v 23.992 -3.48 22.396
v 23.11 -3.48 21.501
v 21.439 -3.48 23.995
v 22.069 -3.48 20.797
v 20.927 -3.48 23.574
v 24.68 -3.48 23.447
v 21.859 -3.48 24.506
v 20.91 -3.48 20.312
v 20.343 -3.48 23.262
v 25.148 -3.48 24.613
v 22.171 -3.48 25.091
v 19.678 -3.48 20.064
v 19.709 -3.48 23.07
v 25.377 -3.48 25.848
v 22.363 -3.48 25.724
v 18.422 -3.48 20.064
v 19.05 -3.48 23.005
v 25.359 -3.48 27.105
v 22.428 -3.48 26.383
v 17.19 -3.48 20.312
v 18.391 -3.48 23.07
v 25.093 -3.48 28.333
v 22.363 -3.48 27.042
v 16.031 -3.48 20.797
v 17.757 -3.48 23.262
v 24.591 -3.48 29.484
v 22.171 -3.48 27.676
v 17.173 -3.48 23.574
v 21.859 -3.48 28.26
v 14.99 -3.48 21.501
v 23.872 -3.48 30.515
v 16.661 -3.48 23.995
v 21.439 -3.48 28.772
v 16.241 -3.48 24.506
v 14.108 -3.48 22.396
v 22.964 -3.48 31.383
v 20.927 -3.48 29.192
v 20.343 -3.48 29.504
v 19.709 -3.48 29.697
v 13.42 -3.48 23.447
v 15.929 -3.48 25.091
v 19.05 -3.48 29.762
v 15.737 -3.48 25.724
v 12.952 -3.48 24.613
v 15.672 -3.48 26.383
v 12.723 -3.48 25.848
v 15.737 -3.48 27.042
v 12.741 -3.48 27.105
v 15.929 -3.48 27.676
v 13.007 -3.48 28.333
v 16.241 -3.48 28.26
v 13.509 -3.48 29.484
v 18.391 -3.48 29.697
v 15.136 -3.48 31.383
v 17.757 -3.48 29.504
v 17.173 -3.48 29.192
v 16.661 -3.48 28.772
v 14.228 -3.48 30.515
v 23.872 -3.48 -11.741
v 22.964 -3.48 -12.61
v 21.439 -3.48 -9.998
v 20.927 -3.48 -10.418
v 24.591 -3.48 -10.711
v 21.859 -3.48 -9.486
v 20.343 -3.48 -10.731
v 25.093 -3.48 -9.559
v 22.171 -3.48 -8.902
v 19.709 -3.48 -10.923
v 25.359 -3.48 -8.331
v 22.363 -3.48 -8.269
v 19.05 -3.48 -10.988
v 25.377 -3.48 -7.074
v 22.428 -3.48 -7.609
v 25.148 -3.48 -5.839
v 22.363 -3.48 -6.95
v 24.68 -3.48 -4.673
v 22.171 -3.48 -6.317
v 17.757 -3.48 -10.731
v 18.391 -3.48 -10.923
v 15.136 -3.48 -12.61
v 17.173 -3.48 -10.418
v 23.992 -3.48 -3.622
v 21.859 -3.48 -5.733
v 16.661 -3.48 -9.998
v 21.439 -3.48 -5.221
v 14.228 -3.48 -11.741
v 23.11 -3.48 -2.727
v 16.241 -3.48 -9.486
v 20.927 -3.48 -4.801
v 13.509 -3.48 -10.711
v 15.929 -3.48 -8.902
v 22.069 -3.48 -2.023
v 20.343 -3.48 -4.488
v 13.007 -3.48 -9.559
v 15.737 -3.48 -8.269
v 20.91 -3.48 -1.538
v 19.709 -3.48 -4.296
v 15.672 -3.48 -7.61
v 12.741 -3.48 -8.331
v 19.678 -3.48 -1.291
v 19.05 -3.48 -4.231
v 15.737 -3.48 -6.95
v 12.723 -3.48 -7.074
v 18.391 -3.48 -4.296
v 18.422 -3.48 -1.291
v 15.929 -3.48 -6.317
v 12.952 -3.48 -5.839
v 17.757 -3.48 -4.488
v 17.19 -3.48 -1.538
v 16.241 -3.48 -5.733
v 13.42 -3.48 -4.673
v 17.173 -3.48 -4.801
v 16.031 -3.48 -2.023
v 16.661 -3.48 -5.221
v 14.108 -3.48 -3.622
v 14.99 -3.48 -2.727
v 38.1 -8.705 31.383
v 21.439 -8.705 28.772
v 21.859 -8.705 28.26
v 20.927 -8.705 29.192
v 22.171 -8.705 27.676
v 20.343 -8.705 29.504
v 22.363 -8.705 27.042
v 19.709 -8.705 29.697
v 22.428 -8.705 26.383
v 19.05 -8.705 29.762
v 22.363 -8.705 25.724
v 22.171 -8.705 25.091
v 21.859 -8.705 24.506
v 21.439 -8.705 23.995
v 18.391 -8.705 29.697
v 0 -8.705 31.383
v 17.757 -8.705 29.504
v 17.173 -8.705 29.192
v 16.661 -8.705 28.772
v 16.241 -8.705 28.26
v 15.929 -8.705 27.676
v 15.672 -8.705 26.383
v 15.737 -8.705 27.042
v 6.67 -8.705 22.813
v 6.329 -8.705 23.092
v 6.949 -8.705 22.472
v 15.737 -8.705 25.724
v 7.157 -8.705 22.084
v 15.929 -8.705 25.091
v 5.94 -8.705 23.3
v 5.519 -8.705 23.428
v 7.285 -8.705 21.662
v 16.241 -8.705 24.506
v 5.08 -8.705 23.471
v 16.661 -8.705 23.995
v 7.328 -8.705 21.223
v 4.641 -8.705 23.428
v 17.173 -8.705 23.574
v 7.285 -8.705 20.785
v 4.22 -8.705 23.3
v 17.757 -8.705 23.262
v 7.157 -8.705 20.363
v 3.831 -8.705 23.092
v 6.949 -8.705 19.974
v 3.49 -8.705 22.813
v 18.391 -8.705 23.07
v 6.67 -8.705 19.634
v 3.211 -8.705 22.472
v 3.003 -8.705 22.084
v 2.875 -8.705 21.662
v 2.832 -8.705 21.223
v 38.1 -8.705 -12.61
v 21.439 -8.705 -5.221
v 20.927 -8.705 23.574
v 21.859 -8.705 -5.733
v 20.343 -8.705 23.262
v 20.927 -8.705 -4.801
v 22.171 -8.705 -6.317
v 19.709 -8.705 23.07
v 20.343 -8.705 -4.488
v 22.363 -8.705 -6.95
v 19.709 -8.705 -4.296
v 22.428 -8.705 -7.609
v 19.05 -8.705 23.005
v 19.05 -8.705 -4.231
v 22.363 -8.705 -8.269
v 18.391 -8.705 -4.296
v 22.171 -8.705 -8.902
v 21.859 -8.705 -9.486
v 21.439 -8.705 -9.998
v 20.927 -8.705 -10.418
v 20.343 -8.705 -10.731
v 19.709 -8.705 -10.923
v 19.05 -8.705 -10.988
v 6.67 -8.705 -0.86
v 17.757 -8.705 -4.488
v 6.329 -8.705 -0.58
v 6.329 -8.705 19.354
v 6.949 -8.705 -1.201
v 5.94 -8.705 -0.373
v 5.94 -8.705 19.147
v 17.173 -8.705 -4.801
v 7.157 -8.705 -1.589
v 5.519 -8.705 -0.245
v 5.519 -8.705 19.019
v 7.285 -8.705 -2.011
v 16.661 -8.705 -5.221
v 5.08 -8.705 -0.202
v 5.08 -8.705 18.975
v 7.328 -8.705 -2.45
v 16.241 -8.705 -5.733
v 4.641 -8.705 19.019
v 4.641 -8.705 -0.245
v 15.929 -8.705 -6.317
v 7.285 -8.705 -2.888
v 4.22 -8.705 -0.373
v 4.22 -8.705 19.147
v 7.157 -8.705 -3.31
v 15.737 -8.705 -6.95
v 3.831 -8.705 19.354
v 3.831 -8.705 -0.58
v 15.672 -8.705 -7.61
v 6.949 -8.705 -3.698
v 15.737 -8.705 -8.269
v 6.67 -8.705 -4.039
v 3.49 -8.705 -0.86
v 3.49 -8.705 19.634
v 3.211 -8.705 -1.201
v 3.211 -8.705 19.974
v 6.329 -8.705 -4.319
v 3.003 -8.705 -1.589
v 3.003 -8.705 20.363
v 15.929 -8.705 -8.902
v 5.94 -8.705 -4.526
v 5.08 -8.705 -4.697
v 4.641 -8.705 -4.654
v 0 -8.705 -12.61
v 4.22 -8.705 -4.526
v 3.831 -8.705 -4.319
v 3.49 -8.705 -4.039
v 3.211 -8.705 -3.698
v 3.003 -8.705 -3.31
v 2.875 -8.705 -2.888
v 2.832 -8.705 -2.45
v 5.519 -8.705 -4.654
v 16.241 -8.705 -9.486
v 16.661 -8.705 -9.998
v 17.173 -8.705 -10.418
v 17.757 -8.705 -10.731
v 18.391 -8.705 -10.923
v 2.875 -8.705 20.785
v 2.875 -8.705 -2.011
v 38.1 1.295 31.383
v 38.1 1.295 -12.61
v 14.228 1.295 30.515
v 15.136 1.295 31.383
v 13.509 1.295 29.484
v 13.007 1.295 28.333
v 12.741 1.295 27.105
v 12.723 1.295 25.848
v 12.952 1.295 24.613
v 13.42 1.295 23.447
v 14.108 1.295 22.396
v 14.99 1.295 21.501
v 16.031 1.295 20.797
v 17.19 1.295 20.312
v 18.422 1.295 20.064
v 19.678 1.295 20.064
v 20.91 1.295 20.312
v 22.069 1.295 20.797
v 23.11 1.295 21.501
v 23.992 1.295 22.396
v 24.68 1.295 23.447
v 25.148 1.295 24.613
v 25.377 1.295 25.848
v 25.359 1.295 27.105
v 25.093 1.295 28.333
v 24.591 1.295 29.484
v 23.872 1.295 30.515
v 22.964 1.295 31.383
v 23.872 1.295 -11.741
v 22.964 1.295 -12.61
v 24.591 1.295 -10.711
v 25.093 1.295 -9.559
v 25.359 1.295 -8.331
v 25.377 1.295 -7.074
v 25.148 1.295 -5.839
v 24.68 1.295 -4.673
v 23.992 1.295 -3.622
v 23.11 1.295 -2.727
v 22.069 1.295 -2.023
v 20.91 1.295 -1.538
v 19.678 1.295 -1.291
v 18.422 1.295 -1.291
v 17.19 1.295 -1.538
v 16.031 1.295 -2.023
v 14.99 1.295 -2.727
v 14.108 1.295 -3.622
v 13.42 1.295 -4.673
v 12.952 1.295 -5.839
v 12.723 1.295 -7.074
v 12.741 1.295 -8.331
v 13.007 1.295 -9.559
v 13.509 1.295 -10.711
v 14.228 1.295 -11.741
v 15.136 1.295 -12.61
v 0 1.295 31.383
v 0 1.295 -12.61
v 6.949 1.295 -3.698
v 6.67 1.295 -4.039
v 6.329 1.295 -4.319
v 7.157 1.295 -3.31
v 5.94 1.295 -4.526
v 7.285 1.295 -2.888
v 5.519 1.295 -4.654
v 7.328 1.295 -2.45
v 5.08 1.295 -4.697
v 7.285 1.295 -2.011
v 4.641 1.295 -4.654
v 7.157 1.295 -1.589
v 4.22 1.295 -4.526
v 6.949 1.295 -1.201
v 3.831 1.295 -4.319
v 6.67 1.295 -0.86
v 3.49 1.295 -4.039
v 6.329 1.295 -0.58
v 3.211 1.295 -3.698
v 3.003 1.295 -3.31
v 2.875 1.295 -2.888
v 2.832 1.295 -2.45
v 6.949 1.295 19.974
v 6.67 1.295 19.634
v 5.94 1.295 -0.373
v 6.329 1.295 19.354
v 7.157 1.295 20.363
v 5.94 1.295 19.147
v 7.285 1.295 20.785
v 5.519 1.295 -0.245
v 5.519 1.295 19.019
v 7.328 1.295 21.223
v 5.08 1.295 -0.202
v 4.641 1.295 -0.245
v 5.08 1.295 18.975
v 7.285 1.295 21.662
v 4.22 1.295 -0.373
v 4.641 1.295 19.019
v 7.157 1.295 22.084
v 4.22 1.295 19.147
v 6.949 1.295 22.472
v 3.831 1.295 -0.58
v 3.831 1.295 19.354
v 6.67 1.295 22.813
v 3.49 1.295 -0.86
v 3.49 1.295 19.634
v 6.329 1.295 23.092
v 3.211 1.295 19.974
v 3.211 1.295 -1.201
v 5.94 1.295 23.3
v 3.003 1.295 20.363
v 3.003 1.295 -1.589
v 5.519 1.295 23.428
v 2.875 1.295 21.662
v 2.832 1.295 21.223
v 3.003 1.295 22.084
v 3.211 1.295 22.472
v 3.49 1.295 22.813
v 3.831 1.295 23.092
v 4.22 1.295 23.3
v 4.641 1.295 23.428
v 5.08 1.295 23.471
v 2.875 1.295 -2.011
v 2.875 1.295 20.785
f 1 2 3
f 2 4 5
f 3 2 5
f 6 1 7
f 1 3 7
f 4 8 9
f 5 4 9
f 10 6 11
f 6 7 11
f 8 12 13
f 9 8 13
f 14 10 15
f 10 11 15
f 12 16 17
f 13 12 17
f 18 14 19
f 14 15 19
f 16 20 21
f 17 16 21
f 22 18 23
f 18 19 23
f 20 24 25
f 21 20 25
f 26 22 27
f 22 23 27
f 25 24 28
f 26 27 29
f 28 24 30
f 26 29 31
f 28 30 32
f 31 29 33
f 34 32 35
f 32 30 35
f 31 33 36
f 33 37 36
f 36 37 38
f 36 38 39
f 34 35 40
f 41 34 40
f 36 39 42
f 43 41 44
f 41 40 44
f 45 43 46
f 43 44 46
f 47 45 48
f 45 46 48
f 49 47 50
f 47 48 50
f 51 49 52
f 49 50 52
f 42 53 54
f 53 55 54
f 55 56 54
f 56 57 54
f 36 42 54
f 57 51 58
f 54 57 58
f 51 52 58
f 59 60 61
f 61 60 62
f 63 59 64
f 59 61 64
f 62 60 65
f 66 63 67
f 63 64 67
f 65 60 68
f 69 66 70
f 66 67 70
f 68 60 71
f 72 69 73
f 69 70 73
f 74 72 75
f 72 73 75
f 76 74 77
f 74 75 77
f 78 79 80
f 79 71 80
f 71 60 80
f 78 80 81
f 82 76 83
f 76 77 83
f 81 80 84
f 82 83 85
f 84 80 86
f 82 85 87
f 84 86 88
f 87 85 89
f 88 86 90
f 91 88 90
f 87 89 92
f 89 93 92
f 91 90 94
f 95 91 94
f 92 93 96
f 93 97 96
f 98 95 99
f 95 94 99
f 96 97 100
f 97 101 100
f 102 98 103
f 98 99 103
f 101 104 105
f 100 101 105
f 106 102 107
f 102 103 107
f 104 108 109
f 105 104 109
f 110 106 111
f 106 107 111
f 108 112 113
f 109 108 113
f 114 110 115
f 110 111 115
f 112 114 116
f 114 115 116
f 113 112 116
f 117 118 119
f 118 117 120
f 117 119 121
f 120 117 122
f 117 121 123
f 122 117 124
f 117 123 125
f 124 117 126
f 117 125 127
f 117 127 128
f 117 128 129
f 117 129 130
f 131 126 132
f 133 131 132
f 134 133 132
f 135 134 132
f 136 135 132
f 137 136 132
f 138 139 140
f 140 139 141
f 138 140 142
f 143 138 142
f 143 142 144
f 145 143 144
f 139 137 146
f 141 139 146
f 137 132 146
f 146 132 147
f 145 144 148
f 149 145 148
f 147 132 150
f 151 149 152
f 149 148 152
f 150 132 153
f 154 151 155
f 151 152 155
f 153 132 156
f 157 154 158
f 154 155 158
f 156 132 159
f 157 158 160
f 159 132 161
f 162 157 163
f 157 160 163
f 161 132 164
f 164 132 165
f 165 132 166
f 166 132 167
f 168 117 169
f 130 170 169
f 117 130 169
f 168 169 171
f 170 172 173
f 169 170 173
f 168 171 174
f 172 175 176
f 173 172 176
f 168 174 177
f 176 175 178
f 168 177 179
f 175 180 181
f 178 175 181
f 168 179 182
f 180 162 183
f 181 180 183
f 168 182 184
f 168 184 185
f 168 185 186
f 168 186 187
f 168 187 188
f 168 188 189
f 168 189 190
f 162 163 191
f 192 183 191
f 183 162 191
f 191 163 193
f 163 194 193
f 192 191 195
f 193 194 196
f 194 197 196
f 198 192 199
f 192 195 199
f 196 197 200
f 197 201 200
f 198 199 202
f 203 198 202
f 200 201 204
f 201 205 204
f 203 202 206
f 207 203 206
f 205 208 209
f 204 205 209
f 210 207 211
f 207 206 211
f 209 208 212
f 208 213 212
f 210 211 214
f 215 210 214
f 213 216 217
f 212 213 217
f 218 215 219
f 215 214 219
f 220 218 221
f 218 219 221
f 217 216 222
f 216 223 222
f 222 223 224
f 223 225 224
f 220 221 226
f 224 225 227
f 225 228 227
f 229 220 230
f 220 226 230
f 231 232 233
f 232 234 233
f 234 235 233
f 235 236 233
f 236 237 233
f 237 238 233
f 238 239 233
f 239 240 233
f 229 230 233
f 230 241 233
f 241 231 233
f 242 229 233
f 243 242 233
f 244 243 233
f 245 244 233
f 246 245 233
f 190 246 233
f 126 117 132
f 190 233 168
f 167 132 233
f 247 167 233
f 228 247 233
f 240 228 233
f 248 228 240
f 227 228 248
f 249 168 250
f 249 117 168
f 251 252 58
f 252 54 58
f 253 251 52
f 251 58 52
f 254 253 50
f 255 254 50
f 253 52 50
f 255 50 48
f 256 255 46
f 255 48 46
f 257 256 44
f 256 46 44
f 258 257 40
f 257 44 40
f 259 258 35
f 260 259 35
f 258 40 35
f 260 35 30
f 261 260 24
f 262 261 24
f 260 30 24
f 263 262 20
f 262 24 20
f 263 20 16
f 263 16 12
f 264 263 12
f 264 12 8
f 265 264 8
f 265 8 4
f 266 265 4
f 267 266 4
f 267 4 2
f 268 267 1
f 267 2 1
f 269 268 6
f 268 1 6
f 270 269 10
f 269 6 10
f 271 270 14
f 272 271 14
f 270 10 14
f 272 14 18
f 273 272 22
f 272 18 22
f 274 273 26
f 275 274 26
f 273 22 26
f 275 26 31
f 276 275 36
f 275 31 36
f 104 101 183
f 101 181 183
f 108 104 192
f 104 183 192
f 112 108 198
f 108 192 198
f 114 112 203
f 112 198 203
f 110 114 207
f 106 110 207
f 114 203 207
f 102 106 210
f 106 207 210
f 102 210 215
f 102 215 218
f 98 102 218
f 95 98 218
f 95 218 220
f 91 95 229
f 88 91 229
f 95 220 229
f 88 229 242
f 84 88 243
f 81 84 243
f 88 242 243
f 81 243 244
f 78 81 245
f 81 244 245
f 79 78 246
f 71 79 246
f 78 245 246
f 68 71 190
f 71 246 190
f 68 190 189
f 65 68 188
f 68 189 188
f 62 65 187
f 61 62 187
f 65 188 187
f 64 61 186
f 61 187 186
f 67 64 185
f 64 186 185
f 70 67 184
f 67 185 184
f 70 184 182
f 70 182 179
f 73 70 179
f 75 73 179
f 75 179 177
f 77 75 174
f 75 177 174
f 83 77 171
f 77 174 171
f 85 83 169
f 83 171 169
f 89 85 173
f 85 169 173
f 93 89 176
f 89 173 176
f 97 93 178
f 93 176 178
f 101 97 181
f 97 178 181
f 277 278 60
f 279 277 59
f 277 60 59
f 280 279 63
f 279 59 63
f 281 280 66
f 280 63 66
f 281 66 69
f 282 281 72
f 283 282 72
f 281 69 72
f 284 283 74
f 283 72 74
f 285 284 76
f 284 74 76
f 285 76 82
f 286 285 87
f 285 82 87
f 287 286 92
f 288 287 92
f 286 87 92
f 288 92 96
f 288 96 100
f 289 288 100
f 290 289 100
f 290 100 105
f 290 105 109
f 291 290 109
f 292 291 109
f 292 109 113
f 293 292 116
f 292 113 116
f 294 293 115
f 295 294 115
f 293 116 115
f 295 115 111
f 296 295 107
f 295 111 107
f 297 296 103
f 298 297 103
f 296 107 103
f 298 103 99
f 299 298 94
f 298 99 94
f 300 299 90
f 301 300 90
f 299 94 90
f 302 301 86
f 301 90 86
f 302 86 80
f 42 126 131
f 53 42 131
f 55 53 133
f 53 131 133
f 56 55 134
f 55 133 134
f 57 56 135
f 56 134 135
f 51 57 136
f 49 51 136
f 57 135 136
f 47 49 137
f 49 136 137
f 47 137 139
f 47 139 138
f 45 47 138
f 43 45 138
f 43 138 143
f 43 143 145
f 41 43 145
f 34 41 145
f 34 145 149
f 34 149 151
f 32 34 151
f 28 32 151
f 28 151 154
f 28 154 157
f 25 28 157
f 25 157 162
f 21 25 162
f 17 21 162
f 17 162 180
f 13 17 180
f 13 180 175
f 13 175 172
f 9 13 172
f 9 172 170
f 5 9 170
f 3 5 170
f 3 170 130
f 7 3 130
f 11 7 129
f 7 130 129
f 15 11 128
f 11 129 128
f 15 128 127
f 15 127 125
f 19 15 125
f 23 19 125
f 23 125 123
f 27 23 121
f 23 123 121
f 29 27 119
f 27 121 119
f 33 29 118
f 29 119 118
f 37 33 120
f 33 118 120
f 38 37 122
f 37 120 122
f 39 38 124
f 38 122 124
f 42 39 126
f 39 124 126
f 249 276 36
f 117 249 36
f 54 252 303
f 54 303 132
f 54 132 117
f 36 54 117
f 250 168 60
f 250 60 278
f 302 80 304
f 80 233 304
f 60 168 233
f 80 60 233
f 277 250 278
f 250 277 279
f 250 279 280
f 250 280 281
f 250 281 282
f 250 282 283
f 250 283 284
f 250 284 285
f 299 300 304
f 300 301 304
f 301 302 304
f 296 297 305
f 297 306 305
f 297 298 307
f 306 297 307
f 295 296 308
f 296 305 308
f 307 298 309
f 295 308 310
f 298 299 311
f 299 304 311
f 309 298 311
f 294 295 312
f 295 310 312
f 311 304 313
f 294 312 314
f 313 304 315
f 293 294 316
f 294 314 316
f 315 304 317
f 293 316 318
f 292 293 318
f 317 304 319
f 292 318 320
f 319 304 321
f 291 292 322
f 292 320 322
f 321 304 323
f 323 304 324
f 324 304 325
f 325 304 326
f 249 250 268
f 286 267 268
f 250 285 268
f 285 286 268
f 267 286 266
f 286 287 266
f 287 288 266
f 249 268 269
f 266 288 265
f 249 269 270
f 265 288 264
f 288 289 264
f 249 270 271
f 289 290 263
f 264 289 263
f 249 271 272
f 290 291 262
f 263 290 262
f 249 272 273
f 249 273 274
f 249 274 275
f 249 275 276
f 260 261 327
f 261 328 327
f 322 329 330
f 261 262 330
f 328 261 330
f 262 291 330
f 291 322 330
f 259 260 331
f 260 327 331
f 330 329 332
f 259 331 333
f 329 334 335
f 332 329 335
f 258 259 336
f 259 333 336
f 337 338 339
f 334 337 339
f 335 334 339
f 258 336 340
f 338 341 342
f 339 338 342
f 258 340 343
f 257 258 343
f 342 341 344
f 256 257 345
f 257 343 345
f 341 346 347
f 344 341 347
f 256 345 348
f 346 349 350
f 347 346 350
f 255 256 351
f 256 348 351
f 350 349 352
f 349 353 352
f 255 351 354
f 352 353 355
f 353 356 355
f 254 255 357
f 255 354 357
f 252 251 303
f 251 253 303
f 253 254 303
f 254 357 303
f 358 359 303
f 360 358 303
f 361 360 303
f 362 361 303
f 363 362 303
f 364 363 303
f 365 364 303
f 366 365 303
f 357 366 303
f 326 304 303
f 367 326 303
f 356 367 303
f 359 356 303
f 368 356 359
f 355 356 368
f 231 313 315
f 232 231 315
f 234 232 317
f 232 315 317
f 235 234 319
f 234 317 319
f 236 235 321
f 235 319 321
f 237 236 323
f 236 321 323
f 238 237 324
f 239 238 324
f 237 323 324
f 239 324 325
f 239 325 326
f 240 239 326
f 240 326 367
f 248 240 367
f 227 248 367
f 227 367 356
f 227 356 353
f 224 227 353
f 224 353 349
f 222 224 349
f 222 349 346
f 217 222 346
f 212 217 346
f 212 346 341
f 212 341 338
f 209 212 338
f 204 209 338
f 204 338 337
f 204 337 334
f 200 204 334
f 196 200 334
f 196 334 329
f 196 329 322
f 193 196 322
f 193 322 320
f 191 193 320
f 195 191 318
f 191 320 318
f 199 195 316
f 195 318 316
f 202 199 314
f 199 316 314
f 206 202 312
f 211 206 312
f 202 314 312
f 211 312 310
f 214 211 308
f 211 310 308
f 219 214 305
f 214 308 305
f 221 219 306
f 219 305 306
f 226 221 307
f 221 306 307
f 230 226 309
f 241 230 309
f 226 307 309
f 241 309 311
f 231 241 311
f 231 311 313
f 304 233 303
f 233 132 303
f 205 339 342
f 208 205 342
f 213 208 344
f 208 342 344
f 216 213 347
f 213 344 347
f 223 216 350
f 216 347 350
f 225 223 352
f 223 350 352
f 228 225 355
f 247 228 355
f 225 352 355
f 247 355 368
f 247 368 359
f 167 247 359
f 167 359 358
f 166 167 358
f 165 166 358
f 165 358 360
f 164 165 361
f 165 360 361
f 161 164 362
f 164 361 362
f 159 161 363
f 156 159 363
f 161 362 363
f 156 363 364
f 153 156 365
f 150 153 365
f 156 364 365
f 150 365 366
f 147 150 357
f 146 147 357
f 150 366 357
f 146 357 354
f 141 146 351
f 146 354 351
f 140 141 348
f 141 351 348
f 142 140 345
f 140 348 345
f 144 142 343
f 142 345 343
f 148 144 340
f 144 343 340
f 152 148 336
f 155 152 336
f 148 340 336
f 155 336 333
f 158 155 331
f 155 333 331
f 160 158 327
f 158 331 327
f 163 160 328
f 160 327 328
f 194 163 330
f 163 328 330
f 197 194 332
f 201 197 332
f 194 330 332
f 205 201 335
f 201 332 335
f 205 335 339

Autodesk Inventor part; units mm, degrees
ref_plane "YZ Plane" through (0, 0, 0) normal (1, 0, 0) x (0, 1, 0)
ref_plane "XZ Plane" through (0, 0, 0) normal (0, 1, 0) x (-1, 0, 0)
ref_plane "XY Plane" through (0, 0, 0) normal (0, 0, 1) x (1, 0, 0)
sketch "Sketch1" plane through (0, 0, 0) normal (1, 0, 0) x (0, 1, 0)
  line L0 (1.2948, 31.3833) -> (-8.7052, 31.3833)
  line L1 (-8.7052, 31.3833) -> (-8.7052, -12.6095)
  line L2 (-8.7052, -12.6095) -> (1.2948, -12.6095)
  line L3 (1.2948, -12.6095) -> (1.2948, 31.3833)
  point P0 (0, 0)
  dimension "d0" = 43.9928
  dimension "d1" = 10
extrude "Extrusion1" add sketch "Sketch1" along normal blind 38.1
sketch "Sketch2" plane through (0, 1.2948, 31.3833) normal (0, 1, 0) x (1, 0, 0)
  line L0 (38.1, 43.9928) -> (38.1, 0) projected
  line L1 (0, 0) -> (38.1, 0) projected
  line L2 (0, 43.9928) -> (38.1, 43.9928) projected
  point P0 (0, 31.3833)
  point P1 (19.05, 5)
  point P2 (19.05, 38.9928)
  dimension "d4" = 0
  dimension "d5" = 19.05
  dimension "d6" = 5
  dimension "d7" = 5
hole "Hole1" at (19.05, 1.2948, 26.3833) at (19.05, 1.2948, -7.6095) direction (0, -1, 0) diameter 6.7564 end through all counterbore diameter 12.7 counterbore depth 4.7752 clearance for "Hex Head Bolt" size "1/4" standard "Ansi Unified Screw Threads"
sketch "Sketch3" plane through (0, -8.7052, -12.6095) normal (0, -1, 0) x (1, 0, 0)
  line L0 (38.1, 43.9928) -> (38.1, 0) projected
  line L1 (0, 43.9928) -> (0, 0) projected
  line L2 (0, 43.9928) -> (38.1, 43.9928) projected
  line L3 (0, 0) -> (38.1, 0) projected
  point P0 (0, 12.6095)
  point P1 (5.08, 33.8328)
  point P2 (5.08, 10.16)
  dimension "d16" = 5.08
  dimension "d24" = 10.16
  dimension "d25" = 10.16
  dimension "d26" = 5.08
hole "Hole2" at (5.08, -8.7052, 21.2233) at (5.08, -8.7052, -2.4495) direction (0, 1, 0) diameter 4.4958 end through all clearance for "Hex Machine Screw" size "#8" standard "Ansi Unified Screw Threads"
properties part number "LidarV4MountShortPlate"
